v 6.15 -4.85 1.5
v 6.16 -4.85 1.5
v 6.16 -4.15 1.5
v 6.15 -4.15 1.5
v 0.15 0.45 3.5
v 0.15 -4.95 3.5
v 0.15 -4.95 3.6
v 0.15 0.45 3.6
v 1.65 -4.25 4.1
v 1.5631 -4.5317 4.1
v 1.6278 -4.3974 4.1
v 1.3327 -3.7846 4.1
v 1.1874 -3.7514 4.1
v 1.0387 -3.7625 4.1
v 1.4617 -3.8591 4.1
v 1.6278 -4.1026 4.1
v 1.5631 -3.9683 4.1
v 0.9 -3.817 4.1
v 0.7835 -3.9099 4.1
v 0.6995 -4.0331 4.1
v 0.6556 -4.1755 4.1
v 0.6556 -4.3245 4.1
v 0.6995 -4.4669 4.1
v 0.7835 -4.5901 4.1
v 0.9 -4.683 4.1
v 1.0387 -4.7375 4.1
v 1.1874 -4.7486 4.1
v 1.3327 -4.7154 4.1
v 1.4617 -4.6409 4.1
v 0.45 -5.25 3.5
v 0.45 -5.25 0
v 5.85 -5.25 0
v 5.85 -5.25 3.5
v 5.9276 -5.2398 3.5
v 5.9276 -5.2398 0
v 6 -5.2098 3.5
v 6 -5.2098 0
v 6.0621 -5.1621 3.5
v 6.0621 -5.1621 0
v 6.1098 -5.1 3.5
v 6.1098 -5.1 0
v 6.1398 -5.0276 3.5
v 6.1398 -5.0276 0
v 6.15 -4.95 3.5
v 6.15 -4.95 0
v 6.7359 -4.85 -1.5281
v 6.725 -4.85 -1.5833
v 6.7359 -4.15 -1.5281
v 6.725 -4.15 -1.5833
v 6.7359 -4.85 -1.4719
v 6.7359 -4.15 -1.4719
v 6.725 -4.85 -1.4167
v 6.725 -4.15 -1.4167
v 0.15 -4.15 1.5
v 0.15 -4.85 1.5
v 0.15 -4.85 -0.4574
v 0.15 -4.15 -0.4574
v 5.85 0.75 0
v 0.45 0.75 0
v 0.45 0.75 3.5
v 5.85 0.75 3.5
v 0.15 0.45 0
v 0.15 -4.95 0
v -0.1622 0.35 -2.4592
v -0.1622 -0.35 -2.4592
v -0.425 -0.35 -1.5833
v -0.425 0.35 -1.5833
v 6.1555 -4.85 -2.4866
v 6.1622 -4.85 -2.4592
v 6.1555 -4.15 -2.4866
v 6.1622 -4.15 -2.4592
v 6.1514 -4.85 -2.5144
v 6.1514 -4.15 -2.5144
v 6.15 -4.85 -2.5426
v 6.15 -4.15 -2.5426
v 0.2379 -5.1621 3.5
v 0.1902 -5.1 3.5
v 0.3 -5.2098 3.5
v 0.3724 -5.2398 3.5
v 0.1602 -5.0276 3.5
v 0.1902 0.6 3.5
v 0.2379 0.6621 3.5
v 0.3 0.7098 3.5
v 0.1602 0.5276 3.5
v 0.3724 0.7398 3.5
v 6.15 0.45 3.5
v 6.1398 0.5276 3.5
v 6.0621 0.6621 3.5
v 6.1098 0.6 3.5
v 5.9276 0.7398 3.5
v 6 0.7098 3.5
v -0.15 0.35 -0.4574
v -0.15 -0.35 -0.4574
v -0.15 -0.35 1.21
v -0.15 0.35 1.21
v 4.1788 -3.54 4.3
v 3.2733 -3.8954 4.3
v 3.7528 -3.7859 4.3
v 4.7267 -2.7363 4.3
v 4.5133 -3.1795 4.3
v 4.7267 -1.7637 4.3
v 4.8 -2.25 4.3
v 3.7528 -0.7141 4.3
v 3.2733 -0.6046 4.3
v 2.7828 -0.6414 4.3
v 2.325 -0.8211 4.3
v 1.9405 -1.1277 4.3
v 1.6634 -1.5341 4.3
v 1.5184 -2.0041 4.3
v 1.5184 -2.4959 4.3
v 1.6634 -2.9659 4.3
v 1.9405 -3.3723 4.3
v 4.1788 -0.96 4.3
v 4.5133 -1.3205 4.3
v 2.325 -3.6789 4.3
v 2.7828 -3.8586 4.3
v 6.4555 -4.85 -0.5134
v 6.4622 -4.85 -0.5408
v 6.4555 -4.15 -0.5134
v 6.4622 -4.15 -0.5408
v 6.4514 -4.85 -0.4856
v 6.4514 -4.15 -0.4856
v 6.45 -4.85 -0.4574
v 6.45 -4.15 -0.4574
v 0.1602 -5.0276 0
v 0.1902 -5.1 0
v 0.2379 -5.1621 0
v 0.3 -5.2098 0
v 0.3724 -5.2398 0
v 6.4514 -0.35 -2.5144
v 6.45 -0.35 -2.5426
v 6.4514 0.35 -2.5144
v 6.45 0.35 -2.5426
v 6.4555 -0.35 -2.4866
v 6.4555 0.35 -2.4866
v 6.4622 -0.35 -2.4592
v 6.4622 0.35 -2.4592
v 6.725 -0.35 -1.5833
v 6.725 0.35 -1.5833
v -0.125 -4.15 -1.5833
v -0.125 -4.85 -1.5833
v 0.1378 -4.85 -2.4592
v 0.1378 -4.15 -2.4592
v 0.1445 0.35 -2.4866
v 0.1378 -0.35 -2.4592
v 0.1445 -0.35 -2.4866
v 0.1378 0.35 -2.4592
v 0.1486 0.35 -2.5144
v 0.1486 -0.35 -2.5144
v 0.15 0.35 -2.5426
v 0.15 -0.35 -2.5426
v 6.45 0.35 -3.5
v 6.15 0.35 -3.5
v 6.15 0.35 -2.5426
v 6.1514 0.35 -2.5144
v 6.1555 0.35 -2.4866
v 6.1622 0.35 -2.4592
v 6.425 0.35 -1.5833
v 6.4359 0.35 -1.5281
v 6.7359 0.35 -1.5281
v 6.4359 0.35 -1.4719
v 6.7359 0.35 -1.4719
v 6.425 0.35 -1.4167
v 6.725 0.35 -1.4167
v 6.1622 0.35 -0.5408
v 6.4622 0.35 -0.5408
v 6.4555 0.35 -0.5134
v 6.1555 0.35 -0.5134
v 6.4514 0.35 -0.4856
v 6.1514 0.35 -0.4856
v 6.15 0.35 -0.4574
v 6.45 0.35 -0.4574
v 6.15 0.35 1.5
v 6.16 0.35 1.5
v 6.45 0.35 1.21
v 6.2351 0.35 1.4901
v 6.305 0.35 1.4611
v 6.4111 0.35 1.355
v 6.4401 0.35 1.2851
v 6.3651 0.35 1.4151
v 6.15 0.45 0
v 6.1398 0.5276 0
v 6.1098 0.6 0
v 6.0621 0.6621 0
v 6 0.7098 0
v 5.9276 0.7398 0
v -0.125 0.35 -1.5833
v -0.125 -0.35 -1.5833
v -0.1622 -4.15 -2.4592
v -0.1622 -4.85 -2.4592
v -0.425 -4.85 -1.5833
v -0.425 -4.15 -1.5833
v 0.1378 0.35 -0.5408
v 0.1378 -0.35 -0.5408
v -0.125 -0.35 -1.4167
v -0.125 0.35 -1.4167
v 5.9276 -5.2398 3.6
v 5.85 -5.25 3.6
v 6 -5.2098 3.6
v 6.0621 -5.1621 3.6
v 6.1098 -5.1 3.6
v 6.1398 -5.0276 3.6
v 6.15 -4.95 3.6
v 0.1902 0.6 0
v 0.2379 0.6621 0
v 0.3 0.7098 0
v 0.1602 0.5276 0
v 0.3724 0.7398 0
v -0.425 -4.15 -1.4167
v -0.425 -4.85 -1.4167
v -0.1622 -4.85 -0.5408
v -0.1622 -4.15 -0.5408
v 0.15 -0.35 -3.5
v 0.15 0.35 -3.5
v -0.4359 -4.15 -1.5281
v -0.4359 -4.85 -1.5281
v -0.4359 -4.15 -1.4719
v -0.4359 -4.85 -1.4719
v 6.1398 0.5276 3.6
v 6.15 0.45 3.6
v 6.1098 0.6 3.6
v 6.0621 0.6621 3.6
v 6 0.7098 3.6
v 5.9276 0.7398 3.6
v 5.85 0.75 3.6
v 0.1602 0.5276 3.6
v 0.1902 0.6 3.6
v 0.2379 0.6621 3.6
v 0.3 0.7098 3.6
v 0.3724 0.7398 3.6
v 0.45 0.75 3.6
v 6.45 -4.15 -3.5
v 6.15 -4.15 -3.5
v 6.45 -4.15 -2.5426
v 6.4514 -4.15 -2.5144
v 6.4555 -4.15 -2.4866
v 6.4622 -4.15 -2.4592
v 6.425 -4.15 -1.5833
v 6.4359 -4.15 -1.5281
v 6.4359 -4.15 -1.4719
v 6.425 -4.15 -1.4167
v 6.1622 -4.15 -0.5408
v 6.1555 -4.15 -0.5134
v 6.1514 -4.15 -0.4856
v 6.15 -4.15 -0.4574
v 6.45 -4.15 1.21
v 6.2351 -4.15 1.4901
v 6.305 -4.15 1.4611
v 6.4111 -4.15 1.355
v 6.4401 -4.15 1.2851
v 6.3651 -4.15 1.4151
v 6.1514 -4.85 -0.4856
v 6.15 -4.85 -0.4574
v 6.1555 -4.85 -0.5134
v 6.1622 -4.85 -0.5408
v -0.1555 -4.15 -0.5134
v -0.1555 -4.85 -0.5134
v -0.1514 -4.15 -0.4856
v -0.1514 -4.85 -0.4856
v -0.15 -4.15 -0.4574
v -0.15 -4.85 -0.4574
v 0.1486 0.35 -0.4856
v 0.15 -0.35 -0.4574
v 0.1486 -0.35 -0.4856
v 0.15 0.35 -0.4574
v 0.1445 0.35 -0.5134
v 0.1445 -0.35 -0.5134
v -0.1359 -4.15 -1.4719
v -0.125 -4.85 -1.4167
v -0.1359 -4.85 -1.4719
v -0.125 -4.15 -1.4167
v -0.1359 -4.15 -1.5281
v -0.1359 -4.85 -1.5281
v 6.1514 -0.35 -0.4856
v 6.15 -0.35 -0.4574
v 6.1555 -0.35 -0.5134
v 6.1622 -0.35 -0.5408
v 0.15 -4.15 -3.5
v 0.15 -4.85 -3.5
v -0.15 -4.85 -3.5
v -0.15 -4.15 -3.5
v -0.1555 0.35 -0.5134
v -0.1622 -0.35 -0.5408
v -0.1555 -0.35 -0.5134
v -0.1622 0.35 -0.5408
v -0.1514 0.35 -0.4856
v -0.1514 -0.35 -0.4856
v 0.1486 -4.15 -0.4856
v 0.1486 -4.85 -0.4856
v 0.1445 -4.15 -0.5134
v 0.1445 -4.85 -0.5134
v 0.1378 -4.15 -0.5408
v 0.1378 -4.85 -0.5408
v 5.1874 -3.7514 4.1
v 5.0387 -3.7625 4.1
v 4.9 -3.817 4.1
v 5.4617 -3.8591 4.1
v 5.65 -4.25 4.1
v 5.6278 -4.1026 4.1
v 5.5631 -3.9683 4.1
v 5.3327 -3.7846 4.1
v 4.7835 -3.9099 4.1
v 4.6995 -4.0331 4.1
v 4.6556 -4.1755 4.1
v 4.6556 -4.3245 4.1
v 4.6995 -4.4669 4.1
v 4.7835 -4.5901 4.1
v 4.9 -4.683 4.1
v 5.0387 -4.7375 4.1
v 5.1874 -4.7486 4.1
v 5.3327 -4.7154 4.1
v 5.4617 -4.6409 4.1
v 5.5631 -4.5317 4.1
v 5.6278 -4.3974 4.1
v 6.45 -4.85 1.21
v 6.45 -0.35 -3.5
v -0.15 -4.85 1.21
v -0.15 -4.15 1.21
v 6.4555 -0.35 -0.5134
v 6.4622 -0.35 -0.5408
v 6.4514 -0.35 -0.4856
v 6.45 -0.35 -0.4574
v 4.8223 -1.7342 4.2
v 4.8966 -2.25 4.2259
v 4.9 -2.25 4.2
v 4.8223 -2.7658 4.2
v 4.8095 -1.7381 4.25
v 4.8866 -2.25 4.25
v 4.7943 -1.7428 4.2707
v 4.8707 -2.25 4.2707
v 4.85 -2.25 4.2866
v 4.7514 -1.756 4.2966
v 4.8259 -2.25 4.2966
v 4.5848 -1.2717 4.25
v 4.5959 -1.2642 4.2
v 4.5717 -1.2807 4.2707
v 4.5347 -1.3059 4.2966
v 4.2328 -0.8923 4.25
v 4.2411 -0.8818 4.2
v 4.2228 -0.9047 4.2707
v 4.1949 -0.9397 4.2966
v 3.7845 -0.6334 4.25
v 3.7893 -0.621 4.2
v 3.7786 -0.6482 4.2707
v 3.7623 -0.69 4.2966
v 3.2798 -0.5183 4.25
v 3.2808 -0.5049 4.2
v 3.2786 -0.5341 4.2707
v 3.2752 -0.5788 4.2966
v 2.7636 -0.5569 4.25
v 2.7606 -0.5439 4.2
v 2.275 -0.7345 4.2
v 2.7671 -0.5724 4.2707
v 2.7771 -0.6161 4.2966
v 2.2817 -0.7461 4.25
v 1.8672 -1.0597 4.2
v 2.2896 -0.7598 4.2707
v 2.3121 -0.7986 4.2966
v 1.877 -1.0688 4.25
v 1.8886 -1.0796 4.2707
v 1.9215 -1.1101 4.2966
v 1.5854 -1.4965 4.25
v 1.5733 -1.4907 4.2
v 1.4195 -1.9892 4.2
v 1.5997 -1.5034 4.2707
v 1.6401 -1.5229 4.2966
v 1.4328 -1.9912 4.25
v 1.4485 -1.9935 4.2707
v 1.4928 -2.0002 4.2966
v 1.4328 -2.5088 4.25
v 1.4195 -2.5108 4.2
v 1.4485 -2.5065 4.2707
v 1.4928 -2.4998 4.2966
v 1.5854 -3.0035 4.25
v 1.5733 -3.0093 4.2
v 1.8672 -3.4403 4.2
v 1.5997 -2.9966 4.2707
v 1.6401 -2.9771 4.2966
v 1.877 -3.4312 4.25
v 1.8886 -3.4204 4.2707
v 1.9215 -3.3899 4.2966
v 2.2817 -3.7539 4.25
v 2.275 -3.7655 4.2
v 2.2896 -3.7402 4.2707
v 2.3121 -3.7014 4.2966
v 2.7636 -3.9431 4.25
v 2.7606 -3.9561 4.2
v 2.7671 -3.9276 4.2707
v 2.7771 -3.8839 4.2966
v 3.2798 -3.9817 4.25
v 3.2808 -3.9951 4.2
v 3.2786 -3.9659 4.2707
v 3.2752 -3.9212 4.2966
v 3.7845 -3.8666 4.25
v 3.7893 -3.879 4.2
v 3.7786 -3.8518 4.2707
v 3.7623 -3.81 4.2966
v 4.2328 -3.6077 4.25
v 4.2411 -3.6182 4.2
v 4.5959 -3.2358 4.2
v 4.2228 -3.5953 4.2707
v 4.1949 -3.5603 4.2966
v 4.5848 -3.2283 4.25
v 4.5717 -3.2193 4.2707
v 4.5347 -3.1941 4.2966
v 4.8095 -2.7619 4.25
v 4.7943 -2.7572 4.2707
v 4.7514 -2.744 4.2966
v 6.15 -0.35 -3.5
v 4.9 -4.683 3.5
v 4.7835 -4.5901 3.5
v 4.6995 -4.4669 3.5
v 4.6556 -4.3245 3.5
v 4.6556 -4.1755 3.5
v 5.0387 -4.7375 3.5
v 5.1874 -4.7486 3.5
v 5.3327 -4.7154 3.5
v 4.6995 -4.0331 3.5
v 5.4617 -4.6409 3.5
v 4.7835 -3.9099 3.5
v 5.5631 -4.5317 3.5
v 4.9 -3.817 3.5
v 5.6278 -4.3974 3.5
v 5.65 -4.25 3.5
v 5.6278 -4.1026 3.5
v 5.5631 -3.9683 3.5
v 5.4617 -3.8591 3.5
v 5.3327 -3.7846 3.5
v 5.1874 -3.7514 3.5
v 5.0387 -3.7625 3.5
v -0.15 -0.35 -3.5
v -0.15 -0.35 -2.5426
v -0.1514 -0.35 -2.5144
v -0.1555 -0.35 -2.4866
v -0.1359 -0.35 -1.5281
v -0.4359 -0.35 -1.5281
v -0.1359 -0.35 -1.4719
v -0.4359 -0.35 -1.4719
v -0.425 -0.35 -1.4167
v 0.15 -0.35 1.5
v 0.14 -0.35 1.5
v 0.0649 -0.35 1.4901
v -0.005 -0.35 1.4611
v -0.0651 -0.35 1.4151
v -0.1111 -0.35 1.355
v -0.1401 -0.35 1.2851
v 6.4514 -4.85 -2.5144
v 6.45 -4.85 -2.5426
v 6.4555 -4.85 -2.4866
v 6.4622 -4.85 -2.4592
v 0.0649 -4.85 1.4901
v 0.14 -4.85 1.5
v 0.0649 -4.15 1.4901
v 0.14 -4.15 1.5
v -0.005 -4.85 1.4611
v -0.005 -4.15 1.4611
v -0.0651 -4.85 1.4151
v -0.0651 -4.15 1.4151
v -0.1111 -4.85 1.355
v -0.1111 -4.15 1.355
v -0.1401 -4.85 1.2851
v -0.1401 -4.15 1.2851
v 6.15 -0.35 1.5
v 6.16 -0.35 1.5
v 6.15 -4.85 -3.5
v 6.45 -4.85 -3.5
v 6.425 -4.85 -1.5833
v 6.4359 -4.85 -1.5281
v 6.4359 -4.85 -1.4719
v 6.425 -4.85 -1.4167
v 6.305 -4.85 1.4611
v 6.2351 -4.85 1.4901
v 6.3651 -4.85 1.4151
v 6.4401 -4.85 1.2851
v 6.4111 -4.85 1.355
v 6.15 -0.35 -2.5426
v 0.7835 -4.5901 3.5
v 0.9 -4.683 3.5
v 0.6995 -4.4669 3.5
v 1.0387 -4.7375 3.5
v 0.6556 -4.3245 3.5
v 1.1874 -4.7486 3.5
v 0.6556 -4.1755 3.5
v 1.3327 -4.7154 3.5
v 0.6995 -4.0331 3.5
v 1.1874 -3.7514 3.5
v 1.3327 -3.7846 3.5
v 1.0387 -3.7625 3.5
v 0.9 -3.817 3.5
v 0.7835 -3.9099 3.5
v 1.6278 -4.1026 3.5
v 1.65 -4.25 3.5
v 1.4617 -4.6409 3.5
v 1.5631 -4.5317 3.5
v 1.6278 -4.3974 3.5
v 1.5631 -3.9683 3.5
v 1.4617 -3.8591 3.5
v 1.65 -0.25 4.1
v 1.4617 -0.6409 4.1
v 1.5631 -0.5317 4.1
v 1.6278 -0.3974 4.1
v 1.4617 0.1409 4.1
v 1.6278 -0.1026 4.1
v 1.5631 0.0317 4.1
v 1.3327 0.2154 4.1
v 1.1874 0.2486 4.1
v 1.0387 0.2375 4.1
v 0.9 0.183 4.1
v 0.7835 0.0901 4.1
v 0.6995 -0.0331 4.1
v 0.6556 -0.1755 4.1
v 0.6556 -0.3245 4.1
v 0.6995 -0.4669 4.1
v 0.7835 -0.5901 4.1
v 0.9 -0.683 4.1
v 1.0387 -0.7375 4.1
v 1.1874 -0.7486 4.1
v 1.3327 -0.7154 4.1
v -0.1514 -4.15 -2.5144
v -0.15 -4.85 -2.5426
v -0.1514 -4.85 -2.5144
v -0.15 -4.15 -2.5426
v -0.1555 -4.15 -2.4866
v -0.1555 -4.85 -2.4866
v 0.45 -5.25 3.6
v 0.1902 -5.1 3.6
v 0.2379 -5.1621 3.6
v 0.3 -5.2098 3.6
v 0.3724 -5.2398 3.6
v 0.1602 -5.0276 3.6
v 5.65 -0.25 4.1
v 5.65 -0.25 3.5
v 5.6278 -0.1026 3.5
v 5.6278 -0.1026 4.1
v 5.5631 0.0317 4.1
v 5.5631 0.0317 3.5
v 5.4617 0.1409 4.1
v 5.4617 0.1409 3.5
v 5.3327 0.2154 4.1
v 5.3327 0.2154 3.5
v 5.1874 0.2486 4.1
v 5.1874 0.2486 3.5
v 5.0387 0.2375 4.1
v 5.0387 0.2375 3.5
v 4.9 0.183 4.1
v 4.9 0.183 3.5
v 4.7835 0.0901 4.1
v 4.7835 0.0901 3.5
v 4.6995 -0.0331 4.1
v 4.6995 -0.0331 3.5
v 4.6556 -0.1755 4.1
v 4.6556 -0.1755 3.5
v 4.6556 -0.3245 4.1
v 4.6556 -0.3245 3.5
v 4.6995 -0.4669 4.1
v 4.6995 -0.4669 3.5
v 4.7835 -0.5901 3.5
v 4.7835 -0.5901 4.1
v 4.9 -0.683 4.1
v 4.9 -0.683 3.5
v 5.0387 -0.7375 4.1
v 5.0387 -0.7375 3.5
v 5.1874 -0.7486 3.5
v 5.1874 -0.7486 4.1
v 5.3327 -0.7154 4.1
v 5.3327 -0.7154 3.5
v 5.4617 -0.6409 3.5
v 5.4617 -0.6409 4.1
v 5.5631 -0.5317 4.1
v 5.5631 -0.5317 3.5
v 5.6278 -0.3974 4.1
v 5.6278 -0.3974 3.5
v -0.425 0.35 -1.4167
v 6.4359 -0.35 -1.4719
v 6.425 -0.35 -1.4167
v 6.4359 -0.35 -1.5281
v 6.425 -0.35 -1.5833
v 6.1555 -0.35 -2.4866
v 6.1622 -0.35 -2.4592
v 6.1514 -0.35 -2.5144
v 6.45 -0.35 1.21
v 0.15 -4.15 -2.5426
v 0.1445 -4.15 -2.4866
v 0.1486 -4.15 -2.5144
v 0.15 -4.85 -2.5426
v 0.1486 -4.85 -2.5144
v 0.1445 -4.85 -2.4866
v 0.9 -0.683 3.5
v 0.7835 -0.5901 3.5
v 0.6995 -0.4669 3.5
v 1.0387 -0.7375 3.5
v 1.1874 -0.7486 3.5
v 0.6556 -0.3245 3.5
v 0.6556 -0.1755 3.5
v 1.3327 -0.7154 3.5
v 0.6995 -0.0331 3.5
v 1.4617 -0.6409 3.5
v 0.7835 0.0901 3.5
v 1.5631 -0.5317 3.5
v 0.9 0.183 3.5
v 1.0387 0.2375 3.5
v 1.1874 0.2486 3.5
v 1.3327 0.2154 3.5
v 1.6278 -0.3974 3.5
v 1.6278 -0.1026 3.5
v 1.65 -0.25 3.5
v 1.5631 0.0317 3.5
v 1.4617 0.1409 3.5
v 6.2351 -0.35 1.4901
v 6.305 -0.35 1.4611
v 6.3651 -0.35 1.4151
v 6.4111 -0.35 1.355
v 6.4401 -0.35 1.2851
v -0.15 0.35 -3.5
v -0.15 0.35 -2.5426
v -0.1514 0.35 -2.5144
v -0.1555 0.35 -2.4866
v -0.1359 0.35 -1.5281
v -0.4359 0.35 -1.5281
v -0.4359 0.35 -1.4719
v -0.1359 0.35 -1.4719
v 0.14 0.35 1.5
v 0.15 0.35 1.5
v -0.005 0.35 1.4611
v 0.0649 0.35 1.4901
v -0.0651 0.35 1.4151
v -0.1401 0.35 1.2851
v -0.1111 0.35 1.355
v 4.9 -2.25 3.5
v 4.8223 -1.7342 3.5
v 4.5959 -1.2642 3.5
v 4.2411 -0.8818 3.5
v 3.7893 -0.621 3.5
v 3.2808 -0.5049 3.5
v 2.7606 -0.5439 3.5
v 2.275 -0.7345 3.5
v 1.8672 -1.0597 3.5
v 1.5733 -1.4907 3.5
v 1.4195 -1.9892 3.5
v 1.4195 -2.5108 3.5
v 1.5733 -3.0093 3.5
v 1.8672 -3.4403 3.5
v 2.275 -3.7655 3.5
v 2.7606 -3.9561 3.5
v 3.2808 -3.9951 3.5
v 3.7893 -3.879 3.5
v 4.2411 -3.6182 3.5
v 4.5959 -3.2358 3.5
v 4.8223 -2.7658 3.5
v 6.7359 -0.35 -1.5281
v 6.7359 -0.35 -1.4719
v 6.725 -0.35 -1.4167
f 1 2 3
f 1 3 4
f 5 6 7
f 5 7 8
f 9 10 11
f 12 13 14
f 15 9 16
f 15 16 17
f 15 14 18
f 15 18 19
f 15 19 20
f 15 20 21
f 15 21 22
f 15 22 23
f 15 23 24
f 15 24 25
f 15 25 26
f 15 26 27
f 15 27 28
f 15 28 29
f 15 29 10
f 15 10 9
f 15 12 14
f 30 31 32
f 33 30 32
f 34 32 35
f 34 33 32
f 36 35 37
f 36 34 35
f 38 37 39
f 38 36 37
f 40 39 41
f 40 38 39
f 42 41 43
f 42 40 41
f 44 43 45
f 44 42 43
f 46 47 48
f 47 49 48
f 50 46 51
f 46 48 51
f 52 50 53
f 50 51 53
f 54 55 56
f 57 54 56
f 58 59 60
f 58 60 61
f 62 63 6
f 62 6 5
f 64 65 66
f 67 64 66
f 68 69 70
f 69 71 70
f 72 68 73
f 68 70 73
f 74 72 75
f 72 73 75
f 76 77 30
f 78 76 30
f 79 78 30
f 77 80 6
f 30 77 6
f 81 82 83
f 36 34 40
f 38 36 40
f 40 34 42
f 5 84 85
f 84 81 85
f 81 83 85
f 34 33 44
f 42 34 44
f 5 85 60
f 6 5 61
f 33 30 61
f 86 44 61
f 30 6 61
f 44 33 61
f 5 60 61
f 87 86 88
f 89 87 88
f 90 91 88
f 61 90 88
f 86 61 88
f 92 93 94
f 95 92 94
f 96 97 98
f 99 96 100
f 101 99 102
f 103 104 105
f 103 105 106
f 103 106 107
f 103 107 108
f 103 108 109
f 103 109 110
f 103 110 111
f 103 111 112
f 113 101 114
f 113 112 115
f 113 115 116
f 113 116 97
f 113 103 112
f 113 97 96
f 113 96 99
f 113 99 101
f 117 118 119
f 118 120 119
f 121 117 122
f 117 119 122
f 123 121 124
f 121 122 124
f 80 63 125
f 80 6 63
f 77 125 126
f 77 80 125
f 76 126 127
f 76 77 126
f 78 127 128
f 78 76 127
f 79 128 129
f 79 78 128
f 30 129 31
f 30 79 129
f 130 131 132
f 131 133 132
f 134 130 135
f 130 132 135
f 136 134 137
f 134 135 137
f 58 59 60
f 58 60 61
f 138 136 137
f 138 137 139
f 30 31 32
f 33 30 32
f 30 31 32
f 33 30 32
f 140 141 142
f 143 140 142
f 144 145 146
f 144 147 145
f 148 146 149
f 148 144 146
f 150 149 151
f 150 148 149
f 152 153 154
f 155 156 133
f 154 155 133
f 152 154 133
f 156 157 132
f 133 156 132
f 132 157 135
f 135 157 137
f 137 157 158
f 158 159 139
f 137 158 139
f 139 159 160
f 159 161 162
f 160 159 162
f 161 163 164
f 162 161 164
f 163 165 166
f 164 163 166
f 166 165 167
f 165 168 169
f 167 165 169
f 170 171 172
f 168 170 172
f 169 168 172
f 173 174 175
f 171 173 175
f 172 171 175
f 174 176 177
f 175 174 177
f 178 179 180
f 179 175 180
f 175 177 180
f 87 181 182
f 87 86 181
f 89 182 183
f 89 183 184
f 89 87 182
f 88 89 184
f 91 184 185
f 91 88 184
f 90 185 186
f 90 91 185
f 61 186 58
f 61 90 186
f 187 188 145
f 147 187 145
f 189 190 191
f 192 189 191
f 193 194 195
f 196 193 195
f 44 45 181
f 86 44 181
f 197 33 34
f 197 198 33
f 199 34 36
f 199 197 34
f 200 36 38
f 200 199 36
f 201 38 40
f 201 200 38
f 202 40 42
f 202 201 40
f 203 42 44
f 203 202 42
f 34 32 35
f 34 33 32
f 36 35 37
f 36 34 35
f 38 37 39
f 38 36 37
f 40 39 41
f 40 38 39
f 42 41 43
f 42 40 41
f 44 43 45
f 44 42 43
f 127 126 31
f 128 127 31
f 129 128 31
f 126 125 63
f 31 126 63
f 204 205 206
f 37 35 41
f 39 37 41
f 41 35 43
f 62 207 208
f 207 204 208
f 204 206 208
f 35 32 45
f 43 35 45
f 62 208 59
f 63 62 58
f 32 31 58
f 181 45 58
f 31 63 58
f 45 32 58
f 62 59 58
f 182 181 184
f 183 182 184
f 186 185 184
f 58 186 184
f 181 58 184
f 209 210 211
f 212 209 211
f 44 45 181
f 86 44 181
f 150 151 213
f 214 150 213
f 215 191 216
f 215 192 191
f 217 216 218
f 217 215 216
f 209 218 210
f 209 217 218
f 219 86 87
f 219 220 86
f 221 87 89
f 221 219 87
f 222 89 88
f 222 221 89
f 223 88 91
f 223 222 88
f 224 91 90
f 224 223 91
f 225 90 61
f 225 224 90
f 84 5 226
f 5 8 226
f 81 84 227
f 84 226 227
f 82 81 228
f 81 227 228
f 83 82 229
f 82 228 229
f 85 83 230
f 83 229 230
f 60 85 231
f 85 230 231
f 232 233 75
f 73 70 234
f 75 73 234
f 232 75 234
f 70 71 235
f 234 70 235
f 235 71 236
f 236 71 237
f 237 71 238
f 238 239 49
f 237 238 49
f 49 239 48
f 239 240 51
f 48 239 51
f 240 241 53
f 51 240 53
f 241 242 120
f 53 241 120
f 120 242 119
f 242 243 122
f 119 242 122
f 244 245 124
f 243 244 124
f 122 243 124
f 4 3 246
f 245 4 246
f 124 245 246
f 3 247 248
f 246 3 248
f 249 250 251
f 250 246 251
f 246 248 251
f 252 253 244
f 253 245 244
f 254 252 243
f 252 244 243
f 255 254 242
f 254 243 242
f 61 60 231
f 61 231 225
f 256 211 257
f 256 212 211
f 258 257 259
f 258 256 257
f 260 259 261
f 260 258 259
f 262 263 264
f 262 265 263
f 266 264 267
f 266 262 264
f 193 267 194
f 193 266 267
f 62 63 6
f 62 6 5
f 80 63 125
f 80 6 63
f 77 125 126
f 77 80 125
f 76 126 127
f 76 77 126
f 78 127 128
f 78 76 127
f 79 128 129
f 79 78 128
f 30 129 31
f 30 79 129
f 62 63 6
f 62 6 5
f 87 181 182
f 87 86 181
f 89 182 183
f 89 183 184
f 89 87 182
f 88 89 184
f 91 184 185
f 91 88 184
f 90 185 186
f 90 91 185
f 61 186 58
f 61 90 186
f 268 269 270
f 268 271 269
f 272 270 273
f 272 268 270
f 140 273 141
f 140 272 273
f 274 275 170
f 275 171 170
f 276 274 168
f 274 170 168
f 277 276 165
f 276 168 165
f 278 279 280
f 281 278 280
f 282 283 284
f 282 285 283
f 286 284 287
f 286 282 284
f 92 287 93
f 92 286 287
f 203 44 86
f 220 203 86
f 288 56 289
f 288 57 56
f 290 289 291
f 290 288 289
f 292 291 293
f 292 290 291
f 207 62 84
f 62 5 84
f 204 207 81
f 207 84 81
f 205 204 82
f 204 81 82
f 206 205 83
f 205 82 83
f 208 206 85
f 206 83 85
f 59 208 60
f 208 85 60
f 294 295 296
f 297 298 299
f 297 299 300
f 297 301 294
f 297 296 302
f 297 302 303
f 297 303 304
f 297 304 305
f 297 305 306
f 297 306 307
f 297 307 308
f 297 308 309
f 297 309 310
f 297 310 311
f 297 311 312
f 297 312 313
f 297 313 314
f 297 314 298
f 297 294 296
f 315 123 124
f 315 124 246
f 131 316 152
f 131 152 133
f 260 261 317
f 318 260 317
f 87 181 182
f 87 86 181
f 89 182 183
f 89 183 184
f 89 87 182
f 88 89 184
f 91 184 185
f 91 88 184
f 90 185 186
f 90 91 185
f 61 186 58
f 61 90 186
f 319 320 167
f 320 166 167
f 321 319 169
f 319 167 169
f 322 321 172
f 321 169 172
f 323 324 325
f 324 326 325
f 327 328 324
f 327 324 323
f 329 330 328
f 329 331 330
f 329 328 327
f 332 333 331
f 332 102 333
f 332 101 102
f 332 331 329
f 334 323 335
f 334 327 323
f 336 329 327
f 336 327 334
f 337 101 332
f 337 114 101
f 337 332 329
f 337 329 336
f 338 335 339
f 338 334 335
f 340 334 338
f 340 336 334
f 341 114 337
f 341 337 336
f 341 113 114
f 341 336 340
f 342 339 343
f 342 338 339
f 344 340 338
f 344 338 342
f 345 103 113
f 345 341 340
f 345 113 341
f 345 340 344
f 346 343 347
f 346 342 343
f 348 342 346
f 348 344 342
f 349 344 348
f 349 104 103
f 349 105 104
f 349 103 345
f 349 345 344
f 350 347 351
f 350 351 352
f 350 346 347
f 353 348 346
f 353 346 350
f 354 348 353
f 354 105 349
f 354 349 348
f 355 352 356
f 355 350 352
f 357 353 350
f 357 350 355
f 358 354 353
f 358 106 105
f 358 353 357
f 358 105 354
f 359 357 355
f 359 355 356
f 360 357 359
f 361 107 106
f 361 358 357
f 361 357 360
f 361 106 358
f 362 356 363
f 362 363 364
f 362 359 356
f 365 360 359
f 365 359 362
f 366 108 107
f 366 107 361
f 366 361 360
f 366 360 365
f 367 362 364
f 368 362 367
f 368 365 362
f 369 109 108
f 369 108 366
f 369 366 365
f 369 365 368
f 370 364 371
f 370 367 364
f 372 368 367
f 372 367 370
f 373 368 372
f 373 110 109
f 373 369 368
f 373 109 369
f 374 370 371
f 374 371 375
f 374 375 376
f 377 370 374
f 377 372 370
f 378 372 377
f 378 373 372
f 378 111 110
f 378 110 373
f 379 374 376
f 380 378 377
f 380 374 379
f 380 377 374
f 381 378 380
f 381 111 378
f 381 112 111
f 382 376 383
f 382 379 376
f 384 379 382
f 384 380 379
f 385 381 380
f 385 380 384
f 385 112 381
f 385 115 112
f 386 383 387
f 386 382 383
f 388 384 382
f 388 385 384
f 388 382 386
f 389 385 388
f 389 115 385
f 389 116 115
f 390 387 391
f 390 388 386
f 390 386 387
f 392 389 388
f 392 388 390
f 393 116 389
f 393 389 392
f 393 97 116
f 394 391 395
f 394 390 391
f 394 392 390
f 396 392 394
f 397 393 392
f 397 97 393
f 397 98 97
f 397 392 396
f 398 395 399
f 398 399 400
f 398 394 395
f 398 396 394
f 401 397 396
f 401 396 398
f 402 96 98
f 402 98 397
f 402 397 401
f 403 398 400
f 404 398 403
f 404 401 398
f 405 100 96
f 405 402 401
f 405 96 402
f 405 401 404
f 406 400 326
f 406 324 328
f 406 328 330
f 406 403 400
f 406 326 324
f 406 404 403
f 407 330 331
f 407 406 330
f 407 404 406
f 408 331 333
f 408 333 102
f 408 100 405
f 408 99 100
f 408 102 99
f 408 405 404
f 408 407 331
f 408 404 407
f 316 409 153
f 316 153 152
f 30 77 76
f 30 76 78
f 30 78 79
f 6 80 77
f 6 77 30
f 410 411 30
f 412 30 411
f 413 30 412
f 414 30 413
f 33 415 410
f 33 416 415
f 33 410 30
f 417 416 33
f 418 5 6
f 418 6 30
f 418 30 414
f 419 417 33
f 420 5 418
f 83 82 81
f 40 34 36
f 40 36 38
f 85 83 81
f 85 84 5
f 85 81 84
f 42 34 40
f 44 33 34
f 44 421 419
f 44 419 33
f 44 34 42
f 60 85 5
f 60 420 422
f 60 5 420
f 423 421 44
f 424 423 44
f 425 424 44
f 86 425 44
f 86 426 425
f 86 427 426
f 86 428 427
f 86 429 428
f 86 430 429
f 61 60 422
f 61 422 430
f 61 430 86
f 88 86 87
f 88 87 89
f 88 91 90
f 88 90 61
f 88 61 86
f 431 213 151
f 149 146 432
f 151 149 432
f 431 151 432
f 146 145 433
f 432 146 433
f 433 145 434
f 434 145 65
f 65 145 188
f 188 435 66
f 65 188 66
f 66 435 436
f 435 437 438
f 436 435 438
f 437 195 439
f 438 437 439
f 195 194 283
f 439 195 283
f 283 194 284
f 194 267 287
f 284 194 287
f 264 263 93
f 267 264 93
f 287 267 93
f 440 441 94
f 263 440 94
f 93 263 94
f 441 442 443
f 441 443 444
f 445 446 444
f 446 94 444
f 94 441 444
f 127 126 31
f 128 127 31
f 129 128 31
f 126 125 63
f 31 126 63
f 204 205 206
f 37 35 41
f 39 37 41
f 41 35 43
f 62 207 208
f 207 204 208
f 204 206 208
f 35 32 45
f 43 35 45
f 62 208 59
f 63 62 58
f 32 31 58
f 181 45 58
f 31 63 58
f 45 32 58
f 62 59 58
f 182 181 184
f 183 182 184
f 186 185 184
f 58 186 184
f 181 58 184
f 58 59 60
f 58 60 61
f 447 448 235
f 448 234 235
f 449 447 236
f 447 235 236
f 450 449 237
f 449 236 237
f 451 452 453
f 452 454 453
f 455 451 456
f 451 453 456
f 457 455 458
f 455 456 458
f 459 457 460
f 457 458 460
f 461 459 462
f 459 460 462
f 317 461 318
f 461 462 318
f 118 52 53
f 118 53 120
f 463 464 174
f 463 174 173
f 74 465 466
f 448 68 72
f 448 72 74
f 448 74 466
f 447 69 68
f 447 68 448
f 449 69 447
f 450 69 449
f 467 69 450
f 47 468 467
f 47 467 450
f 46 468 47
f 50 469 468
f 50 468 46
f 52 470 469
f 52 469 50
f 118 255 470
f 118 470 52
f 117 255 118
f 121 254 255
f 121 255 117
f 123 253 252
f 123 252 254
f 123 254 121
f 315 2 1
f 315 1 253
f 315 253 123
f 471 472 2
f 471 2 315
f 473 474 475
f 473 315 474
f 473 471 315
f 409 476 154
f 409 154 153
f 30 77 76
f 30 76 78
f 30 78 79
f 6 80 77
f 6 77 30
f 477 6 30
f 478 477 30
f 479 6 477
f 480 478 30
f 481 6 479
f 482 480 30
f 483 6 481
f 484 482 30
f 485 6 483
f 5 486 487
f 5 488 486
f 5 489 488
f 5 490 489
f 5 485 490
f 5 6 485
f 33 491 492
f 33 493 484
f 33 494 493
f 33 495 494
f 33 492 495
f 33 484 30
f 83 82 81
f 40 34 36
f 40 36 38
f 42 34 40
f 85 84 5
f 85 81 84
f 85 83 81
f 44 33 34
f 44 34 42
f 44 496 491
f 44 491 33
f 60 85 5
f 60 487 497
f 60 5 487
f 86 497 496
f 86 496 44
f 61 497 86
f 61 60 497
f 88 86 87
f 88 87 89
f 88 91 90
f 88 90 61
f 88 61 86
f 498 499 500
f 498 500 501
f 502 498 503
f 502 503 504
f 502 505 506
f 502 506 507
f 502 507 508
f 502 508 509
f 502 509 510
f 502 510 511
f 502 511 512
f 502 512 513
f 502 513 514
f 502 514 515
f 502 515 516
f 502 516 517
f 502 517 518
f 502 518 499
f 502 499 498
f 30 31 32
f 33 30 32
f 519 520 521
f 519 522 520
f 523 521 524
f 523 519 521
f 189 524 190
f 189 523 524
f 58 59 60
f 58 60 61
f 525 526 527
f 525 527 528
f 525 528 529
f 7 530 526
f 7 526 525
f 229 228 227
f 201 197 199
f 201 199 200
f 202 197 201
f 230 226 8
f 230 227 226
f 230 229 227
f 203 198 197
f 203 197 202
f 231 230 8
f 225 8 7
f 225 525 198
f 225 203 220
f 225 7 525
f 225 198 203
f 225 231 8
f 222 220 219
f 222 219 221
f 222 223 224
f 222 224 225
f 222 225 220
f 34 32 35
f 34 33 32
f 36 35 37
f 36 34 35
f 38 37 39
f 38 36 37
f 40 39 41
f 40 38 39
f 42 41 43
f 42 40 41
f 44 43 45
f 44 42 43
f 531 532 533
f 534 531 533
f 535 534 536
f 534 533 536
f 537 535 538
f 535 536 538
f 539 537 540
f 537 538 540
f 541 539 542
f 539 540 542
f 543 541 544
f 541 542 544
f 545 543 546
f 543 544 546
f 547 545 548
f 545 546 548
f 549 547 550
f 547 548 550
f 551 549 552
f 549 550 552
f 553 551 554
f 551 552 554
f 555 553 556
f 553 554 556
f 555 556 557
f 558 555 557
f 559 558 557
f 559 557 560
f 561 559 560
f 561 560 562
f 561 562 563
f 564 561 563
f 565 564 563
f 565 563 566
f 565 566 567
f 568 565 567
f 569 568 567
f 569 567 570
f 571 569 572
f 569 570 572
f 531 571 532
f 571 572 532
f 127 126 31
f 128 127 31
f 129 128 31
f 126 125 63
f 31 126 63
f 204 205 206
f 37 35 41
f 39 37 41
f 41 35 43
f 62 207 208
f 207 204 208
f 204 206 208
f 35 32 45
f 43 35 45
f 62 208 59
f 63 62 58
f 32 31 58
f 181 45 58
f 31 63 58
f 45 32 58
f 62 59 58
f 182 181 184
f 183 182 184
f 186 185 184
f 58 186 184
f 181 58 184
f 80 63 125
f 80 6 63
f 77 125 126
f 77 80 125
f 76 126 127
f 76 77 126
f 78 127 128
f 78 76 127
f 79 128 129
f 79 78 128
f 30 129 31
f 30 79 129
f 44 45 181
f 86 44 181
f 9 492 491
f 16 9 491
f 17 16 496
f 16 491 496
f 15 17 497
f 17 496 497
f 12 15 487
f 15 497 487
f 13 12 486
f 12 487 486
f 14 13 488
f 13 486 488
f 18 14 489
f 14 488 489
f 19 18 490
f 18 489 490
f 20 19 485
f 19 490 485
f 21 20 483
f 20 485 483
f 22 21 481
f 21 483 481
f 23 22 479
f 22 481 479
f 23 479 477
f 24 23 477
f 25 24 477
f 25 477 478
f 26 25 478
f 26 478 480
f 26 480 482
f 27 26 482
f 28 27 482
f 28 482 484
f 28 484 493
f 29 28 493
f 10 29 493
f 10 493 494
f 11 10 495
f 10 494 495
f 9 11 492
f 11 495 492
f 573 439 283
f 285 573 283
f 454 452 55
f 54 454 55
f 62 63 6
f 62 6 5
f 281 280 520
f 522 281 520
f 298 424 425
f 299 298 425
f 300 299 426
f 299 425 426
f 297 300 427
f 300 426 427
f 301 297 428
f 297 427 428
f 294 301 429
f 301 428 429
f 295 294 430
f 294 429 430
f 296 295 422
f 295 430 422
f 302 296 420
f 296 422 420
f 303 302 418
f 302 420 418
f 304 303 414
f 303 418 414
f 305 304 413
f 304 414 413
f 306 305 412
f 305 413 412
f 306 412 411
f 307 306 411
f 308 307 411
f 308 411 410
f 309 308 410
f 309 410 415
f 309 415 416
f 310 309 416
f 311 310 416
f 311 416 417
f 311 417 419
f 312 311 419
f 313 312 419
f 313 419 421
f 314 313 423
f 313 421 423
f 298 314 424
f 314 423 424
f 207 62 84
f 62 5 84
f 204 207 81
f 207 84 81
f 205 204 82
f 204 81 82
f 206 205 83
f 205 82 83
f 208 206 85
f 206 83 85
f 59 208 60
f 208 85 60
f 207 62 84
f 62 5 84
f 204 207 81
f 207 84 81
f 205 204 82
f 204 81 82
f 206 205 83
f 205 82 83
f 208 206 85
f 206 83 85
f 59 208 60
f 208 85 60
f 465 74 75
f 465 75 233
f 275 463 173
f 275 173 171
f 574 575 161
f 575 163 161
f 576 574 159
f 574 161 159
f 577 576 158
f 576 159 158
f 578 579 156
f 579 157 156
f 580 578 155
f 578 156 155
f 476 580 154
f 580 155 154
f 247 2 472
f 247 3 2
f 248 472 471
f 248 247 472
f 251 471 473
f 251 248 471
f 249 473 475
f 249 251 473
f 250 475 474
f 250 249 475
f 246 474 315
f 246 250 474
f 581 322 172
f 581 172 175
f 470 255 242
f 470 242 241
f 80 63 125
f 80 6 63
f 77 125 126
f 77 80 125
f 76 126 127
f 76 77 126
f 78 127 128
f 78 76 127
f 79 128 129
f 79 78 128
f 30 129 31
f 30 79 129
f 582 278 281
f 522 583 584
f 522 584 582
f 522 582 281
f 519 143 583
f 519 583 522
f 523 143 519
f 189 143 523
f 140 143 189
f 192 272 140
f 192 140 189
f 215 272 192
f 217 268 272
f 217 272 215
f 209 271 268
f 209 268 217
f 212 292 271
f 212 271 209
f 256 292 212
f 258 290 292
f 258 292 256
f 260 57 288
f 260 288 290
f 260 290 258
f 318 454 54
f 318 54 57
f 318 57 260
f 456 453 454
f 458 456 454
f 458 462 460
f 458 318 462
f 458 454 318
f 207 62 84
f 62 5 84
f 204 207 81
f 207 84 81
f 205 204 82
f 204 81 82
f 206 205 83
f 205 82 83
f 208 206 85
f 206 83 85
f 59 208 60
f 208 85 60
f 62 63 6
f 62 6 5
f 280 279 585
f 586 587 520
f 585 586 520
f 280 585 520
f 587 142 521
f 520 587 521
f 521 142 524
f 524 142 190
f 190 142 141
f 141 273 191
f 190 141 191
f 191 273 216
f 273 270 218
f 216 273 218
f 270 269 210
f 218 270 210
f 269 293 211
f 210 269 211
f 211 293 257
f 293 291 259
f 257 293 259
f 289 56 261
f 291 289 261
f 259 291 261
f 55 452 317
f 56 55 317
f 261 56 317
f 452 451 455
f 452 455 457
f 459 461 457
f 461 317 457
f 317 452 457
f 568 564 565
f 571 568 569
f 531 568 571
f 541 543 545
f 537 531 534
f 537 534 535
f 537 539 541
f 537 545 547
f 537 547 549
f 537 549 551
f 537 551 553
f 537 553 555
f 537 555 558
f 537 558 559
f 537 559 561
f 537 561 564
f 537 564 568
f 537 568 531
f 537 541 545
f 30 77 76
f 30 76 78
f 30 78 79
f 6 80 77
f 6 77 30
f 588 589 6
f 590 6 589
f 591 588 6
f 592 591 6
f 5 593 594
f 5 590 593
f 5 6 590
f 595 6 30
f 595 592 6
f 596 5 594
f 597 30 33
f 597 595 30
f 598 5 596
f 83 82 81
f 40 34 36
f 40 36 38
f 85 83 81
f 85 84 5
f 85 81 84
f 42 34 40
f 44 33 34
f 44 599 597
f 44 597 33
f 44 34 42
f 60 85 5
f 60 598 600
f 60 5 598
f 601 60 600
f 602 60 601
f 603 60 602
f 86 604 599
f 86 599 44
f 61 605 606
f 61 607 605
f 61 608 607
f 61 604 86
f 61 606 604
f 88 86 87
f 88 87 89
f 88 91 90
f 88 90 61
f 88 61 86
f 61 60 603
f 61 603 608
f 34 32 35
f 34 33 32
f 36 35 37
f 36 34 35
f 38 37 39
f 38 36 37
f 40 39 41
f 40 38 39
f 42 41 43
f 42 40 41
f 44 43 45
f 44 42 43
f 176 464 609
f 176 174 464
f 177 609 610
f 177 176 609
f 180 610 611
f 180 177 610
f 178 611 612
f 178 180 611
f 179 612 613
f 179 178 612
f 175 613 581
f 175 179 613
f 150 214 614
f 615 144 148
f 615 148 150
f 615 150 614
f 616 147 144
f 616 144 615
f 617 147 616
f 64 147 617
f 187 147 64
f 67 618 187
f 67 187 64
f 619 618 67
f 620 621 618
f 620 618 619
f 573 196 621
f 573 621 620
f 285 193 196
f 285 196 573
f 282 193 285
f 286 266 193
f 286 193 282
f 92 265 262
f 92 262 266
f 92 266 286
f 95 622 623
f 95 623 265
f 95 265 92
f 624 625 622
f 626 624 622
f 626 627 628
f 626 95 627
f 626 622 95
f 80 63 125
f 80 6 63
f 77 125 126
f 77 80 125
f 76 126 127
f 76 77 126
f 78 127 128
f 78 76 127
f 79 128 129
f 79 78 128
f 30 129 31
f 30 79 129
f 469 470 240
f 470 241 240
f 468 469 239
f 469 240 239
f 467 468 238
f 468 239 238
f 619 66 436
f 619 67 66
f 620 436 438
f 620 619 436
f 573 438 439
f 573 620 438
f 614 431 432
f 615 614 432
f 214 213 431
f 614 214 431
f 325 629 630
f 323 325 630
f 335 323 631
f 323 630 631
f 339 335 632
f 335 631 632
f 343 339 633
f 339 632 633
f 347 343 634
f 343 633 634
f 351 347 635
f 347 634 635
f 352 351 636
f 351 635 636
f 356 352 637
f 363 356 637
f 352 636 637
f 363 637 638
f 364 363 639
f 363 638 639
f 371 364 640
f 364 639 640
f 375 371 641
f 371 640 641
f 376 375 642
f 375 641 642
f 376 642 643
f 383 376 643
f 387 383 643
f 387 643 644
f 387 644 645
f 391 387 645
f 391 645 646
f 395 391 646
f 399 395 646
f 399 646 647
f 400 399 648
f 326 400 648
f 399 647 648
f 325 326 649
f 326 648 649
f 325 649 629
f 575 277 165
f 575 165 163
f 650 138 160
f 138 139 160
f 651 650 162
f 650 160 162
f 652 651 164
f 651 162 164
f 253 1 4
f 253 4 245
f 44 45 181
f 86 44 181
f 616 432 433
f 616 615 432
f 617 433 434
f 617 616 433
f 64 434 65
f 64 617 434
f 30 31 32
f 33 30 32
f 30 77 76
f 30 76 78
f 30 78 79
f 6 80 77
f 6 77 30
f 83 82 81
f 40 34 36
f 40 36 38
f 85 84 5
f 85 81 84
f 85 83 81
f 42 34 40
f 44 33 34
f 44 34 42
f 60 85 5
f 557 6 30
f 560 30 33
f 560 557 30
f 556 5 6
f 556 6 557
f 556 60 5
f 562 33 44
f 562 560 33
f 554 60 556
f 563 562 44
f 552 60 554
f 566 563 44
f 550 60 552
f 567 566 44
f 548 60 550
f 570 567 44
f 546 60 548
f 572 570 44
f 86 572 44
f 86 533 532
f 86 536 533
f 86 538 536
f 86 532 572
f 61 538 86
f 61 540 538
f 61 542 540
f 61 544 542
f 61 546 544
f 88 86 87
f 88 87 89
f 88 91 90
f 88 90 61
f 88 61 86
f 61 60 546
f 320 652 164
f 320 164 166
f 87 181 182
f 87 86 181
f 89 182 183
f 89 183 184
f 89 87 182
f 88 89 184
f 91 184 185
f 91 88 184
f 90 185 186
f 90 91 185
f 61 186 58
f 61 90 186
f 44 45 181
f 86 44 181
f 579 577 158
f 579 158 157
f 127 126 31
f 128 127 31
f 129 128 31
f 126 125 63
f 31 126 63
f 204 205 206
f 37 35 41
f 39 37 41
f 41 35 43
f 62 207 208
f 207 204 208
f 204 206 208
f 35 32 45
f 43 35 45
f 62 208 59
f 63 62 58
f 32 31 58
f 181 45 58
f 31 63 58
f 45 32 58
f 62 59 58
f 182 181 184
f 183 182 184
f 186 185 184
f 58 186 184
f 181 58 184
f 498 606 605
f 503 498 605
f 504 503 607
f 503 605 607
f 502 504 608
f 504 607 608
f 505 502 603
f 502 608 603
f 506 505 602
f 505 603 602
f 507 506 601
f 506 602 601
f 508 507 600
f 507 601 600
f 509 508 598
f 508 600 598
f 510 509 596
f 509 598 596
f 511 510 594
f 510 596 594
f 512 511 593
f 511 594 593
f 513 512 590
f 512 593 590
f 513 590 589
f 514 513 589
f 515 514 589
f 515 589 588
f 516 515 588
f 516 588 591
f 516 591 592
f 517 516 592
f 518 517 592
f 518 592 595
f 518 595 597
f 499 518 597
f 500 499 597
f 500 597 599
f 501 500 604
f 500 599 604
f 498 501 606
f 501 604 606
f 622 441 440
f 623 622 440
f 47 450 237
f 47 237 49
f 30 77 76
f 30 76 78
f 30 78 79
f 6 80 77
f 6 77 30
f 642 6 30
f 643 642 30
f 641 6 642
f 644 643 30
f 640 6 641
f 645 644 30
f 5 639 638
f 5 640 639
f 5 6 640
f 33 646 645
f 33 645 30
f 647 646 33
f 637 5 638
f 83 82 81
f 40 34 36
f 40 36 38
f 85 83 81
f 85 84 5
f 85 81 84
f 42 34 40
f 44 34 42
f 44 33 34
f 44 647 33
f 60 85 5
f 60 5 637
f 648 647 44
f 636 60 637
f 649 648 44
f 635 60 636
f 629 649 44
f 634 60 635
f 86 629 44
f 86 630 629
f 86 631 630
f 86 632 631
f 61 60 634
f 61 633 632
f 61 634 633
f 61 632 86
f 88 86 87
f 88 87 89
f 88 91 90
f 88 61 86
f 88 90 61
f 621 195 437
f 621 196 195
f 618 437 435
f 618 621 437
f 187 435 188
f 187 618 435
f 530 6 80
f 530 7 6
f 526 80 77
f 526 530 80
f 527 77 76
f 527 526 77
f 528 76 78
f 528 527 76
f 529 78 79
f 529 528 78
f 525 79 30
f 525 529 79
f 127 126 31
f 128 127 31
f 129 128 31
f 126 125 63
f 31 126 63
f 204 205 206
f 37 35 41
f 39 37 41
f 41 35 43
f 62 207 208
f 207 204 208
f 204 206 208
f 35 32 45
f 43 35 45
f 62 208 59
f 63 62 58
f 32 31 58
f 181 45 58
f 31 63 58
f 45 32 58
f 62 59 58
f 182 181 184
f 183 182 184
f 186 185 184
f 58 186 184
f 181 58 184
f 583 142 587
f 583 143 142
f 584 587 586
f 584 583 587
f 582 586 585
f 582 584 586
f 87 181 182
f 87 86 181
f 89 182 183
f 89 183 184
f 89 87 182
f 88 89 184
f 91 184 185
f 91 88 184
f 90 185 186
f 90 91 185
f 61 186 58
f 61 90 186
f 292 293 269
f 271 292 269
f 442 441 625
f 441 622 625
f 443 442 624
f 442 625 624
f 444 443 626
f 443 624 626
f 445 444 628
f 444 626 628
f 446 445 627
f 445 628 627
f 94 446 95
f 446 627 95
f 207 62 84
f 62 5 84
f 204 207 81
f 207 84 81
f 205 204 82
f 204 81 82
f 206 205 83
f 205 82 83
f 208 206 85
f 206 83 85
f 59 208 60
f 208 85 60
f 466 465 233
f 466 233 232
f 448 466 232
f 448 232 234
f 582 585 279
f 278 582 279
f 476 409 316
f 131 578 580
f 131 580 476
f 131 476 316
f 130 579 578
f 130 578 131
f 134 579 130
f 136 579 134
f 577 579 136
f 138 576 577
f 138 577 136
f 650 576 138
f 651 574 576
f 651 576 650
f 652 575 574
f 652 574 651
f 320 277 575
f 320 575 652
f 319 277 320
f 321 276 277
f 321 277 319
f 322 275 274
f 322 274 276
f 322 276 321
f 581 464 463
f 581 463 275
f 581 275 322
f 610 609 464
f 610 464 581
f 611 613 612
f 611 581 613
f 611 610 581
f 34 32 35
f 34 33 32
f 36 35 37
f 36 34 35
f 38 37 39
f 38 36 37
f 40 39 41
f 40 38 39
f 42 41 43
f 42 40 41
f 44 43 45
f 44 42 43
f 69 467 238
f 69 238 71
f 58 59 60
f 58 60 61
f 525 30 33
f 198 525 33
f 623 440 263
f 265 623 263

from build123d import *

# Parameters (mm, degrees)
SKETCH001_W  = 6
SKETCH001_H  = 6
PAD001_DEPTH = 0.1
FILLET001_R  = 0.3
SKETCH_W     = 6
SKETCH_H     = 6
PAD_DEPTH    = 3.5
FILLET_R     = 0.3
SKETCH005_R  = 0.5
PAD002_DEPTH = 0.6
SKETCH004_R  = 0.5
PAD003_DEPTH = 0.6
SKETCH003_R  = 0.5
PAD004_DEPTH = 0.6
SKETCH002_R  = 0.5
PAD005_DEPTH = 0.6
PAD007_DEPTH = 0.7
FILLET002_R  = 0.29
PAD008_DEPTH = 0.7
FILLET003_R  = 0.29
PAD009_DEPTH = 0.7
FILLET004_R  = 0.29
PAD010_DEPTH = 0.7
FILLET005_R  = 0.29
SKETCH006_R  = 1.75
PAD006_DEPTH = 0.8
FILLET006_R  = 0.1


with BuildPart() as fillet001:
    # Sketch001 → Pad001 (new body)
    with BuildSketch(Plane.XY.offset(3.5)):
        with Locations((3.15, -2.25)):
            Rectangle(SKETCH001_W, SKETCH001_H)
    extrude(amount=PAD001_DEPTH)

    # Fillet001
    fillet001_edges = [fillet001.edges().sort_by_distance(p)[0] for p in [
        (6.15, -5.25, 3.55),
        (0.15, -5.25, 3.55),
        (6.15, 0.75, 3.55),
        (0.15, 0.75, 3.55),
    ]]
    fillet(fillet001_edges, radius=FILLET001_R)


with BuildPart() as fillet_body:
    # Sketch → Pad (new body)
    with BuildSketch(Plane.XY):
        with Locations((3.15, -2.25)):
            Rectangle(SKETCH_W, SKETCH_H)
    extrude(amount=PAD_DEPTH)

    # Fillet
    fillet_edges = [fillet_body.edges().sort_by_distance(p)[0] for p in [
        (6.15, 0.75, 1.75),
        (6.15, -5.25, 1.75),
        (0.15, -5.25, 1.75),
        (0.15, 0.75, 1.75),
    ]]
    fillet(fillet_edges, radius=FILLET_R)


with BuildPart() as pad002:
    # Pad002 base: copy of Fillet body
    add(fillet_body.part)

    # Sketch005 → Pad002 (new body)
    with BuildSketch(Plane.XY.offset(3.5)):
        with Locations((1.15, -0.25)):
            Circle(SKETCH005_R)
    extrude(amount=PAD002_DEPTH)


with BuildPart() as pad003:
    # Pad003 base: copy of Fillet body
    add(fillet_body.part)

    # Sketch004 → Pad003 (new body)
    with BuildSketch(Plane.XY.offset(3.5)):
        with Locations((5.15, -0.25)):
            Circle(SKETCH004_R)
    extrude(amount=PAD003_DEPTH)


with BuildPart() as pad004:
    # Pad004 base: copy of Fillet body
    add(fillet_body.part)

    # Sketch003 → Pad004 (new body)
    with BuildSketch(Plane.XY.offset(3.5)):
        with Locations((5.15, -4.25)):
            Circle(SKETCH003_R)
    extrude(amount=PAD004_DEPTH)


with BuildPart() as pad005:
    # Pad005 base: copy of Fillet body
    add(fillet_body.part)

    # Sketch002 → Pad005 (new body)
    with BuildSketch(Plane.XY.offset(3.5)):
        with Locations((1.15, -4.25)):
            Circle(SKETCH002_R)
    extrude(amount=PAD005_DEPTH)


with BuildPart() as fillet002:
    # Sketch007 → Pad007 (new body)
    with BuildSketch(Plane.XZ.offset(4.85)):
        Polygon((-0.15, 1.5), (0.15, 1.5), (0.15, -0.5), (-0.15, -1.5), (0.15, -2.5), (0.15, -3.5), (-0.15, -3.5), (-0.15, -2.5), (-0.45, -1.5), (-0.15, -0.5), align=None)
    extrude(amount=-PAD007_DEPTH)

    # Fillet002
    fillet002_edges = [fillet002.edges().sort_by_distance(p)[0] for p in [
        (-0.15, -4.5, -2.5),
        (-0.15, -4.5, -0.5),
        (-0.45, -4.5, -1.5),
        (-0.15, -4.5, 1.5),
        (0.15, -4.5, -0.5),
        (-0.15, -4.5, -1.5),
        (0.15, -4.5, -2.5),
    ]]
    fillet(fillet002_edges, radius=FILLET002_R)


with BuildPart() as fillet003:
    # Sketch008 → Pad008 (new body)
    with BuildSketch(Plane.XZ.offset(0.35)):
        Polygon((-0.15, 1.5), (0.15, 1.5), (0.15, -0.5), (-0.15, -1.5), (0.15, -2.5), (0.15, -3.5), (-0.15, -3.5), (-0.15, -2.5), (-0.45, -1.5), (-0.15, -0.5), align=None)
    extrude(amount=-PAD008_DEPTH)

    # Fillet003
    fillet003_edges = [fillet003.edges().sort_by_distance(p)[0] for p in [
        (-0.15, 0, -2.5),
        (-0.15, 0, -0.5),
        (-0.45, 0, -1.5),
        (-0.15, 0, 1.5),
        (0.15, 0, -0.5),
        (-0.15, 0, -1.5),
        (0.15, 0, -2.5),
    ]]
    fillet(fillet003_edges, radius=FILLET003_R)


with BuildPart() as fillet004:
    # Sketch009 → Pad009 (new body)
    with BuildSketch(Plane.XZ.offset(4.85)):
        Polygon((6.45, 1.5), (6.15, 1.5), (6.15, -0.5), (6.45, -1.5), (6.15, -2.5), (6.15, -3.5), (6.45, -3.5), (6.45, -2.5), (6.75, -1.5), (6.45, -0.5), align=None)
    extrude(amount=-PAD009_DEPTH)

    # Fillet004
    fillet004_edges = [fillet004.edges().sort_by_distance(p)[0] for p in [
        (6.45, -4.5, -2.5),
        (6.45, -4.5, -0.5),
        (6.75, -4.5, -1.5),
        (6.45, -4.5, 1.5),
        (6.15, -4.5, -0.5),
        (6.45, -4.5, -1.5),
        (6.15, -4.5, -2.5),
    ]]
    fillet(fillet004_edges, radius=FILLET004_R)


with BuildPart() as fillet005:
    # Sketch010 → Pad010 (new body)
    with BuildSketch(Plane.XZ.offset(0.35)):
        Polygon((6.45, 1.5), (6.15, 1.5), (6.15, -0.5), (6.45, -1.5), (6.15, -2.5), (6.15, -3.5), (6.45, -3.5), (6.45, -2.5), (6.75, -1.5), (6.45, -0.5), align=None)
    extrude(amount=-PAD010_DEPTH)

    # Fillet005
    fillet005_edges = [fillet005.edges().sort_by_distance(p)[0] for p in [
        (6.45, 0, -2.5),
        (6.45, 0, -0.5),
        (6.75, 0, -1.5),
        (6.45, 0, 1.5),
        (6.15, 0, -0.5),
        (6.45, 0, -1.5),
        (6.15, 0, -2.5),
    ]]
    fillet(fillet005_edges, radius=FILLET005_R)


with BuildPart() as fillet006:
    # Pad006 base: copy of Fillet body
    add(fillet_body.part)

    # Sketch006 → Pad006 (new body)
    with BuildSketch(Plane.XY.offset(3.5)):
        with Locations((3.15, -2.25)):
            Circle(SKETCH006_R)
    extrude(amount=PAD006_DEPTH)

    # Fillet006
    fillet006_edges = [fillet006.edges().sort_by_distance(p)[0] for p in [
        (1.4, -2.25, 4.3),
    ]]
    fillet(fillet006_edges, radius=FILLET006_R)


solid = Compound([fillet001.part, pad002.part, pad003.part, pad004.part, pad005.part, fillet002.part, fillet003.part, fillet004.part, fillet005.part, fillet006.part])
